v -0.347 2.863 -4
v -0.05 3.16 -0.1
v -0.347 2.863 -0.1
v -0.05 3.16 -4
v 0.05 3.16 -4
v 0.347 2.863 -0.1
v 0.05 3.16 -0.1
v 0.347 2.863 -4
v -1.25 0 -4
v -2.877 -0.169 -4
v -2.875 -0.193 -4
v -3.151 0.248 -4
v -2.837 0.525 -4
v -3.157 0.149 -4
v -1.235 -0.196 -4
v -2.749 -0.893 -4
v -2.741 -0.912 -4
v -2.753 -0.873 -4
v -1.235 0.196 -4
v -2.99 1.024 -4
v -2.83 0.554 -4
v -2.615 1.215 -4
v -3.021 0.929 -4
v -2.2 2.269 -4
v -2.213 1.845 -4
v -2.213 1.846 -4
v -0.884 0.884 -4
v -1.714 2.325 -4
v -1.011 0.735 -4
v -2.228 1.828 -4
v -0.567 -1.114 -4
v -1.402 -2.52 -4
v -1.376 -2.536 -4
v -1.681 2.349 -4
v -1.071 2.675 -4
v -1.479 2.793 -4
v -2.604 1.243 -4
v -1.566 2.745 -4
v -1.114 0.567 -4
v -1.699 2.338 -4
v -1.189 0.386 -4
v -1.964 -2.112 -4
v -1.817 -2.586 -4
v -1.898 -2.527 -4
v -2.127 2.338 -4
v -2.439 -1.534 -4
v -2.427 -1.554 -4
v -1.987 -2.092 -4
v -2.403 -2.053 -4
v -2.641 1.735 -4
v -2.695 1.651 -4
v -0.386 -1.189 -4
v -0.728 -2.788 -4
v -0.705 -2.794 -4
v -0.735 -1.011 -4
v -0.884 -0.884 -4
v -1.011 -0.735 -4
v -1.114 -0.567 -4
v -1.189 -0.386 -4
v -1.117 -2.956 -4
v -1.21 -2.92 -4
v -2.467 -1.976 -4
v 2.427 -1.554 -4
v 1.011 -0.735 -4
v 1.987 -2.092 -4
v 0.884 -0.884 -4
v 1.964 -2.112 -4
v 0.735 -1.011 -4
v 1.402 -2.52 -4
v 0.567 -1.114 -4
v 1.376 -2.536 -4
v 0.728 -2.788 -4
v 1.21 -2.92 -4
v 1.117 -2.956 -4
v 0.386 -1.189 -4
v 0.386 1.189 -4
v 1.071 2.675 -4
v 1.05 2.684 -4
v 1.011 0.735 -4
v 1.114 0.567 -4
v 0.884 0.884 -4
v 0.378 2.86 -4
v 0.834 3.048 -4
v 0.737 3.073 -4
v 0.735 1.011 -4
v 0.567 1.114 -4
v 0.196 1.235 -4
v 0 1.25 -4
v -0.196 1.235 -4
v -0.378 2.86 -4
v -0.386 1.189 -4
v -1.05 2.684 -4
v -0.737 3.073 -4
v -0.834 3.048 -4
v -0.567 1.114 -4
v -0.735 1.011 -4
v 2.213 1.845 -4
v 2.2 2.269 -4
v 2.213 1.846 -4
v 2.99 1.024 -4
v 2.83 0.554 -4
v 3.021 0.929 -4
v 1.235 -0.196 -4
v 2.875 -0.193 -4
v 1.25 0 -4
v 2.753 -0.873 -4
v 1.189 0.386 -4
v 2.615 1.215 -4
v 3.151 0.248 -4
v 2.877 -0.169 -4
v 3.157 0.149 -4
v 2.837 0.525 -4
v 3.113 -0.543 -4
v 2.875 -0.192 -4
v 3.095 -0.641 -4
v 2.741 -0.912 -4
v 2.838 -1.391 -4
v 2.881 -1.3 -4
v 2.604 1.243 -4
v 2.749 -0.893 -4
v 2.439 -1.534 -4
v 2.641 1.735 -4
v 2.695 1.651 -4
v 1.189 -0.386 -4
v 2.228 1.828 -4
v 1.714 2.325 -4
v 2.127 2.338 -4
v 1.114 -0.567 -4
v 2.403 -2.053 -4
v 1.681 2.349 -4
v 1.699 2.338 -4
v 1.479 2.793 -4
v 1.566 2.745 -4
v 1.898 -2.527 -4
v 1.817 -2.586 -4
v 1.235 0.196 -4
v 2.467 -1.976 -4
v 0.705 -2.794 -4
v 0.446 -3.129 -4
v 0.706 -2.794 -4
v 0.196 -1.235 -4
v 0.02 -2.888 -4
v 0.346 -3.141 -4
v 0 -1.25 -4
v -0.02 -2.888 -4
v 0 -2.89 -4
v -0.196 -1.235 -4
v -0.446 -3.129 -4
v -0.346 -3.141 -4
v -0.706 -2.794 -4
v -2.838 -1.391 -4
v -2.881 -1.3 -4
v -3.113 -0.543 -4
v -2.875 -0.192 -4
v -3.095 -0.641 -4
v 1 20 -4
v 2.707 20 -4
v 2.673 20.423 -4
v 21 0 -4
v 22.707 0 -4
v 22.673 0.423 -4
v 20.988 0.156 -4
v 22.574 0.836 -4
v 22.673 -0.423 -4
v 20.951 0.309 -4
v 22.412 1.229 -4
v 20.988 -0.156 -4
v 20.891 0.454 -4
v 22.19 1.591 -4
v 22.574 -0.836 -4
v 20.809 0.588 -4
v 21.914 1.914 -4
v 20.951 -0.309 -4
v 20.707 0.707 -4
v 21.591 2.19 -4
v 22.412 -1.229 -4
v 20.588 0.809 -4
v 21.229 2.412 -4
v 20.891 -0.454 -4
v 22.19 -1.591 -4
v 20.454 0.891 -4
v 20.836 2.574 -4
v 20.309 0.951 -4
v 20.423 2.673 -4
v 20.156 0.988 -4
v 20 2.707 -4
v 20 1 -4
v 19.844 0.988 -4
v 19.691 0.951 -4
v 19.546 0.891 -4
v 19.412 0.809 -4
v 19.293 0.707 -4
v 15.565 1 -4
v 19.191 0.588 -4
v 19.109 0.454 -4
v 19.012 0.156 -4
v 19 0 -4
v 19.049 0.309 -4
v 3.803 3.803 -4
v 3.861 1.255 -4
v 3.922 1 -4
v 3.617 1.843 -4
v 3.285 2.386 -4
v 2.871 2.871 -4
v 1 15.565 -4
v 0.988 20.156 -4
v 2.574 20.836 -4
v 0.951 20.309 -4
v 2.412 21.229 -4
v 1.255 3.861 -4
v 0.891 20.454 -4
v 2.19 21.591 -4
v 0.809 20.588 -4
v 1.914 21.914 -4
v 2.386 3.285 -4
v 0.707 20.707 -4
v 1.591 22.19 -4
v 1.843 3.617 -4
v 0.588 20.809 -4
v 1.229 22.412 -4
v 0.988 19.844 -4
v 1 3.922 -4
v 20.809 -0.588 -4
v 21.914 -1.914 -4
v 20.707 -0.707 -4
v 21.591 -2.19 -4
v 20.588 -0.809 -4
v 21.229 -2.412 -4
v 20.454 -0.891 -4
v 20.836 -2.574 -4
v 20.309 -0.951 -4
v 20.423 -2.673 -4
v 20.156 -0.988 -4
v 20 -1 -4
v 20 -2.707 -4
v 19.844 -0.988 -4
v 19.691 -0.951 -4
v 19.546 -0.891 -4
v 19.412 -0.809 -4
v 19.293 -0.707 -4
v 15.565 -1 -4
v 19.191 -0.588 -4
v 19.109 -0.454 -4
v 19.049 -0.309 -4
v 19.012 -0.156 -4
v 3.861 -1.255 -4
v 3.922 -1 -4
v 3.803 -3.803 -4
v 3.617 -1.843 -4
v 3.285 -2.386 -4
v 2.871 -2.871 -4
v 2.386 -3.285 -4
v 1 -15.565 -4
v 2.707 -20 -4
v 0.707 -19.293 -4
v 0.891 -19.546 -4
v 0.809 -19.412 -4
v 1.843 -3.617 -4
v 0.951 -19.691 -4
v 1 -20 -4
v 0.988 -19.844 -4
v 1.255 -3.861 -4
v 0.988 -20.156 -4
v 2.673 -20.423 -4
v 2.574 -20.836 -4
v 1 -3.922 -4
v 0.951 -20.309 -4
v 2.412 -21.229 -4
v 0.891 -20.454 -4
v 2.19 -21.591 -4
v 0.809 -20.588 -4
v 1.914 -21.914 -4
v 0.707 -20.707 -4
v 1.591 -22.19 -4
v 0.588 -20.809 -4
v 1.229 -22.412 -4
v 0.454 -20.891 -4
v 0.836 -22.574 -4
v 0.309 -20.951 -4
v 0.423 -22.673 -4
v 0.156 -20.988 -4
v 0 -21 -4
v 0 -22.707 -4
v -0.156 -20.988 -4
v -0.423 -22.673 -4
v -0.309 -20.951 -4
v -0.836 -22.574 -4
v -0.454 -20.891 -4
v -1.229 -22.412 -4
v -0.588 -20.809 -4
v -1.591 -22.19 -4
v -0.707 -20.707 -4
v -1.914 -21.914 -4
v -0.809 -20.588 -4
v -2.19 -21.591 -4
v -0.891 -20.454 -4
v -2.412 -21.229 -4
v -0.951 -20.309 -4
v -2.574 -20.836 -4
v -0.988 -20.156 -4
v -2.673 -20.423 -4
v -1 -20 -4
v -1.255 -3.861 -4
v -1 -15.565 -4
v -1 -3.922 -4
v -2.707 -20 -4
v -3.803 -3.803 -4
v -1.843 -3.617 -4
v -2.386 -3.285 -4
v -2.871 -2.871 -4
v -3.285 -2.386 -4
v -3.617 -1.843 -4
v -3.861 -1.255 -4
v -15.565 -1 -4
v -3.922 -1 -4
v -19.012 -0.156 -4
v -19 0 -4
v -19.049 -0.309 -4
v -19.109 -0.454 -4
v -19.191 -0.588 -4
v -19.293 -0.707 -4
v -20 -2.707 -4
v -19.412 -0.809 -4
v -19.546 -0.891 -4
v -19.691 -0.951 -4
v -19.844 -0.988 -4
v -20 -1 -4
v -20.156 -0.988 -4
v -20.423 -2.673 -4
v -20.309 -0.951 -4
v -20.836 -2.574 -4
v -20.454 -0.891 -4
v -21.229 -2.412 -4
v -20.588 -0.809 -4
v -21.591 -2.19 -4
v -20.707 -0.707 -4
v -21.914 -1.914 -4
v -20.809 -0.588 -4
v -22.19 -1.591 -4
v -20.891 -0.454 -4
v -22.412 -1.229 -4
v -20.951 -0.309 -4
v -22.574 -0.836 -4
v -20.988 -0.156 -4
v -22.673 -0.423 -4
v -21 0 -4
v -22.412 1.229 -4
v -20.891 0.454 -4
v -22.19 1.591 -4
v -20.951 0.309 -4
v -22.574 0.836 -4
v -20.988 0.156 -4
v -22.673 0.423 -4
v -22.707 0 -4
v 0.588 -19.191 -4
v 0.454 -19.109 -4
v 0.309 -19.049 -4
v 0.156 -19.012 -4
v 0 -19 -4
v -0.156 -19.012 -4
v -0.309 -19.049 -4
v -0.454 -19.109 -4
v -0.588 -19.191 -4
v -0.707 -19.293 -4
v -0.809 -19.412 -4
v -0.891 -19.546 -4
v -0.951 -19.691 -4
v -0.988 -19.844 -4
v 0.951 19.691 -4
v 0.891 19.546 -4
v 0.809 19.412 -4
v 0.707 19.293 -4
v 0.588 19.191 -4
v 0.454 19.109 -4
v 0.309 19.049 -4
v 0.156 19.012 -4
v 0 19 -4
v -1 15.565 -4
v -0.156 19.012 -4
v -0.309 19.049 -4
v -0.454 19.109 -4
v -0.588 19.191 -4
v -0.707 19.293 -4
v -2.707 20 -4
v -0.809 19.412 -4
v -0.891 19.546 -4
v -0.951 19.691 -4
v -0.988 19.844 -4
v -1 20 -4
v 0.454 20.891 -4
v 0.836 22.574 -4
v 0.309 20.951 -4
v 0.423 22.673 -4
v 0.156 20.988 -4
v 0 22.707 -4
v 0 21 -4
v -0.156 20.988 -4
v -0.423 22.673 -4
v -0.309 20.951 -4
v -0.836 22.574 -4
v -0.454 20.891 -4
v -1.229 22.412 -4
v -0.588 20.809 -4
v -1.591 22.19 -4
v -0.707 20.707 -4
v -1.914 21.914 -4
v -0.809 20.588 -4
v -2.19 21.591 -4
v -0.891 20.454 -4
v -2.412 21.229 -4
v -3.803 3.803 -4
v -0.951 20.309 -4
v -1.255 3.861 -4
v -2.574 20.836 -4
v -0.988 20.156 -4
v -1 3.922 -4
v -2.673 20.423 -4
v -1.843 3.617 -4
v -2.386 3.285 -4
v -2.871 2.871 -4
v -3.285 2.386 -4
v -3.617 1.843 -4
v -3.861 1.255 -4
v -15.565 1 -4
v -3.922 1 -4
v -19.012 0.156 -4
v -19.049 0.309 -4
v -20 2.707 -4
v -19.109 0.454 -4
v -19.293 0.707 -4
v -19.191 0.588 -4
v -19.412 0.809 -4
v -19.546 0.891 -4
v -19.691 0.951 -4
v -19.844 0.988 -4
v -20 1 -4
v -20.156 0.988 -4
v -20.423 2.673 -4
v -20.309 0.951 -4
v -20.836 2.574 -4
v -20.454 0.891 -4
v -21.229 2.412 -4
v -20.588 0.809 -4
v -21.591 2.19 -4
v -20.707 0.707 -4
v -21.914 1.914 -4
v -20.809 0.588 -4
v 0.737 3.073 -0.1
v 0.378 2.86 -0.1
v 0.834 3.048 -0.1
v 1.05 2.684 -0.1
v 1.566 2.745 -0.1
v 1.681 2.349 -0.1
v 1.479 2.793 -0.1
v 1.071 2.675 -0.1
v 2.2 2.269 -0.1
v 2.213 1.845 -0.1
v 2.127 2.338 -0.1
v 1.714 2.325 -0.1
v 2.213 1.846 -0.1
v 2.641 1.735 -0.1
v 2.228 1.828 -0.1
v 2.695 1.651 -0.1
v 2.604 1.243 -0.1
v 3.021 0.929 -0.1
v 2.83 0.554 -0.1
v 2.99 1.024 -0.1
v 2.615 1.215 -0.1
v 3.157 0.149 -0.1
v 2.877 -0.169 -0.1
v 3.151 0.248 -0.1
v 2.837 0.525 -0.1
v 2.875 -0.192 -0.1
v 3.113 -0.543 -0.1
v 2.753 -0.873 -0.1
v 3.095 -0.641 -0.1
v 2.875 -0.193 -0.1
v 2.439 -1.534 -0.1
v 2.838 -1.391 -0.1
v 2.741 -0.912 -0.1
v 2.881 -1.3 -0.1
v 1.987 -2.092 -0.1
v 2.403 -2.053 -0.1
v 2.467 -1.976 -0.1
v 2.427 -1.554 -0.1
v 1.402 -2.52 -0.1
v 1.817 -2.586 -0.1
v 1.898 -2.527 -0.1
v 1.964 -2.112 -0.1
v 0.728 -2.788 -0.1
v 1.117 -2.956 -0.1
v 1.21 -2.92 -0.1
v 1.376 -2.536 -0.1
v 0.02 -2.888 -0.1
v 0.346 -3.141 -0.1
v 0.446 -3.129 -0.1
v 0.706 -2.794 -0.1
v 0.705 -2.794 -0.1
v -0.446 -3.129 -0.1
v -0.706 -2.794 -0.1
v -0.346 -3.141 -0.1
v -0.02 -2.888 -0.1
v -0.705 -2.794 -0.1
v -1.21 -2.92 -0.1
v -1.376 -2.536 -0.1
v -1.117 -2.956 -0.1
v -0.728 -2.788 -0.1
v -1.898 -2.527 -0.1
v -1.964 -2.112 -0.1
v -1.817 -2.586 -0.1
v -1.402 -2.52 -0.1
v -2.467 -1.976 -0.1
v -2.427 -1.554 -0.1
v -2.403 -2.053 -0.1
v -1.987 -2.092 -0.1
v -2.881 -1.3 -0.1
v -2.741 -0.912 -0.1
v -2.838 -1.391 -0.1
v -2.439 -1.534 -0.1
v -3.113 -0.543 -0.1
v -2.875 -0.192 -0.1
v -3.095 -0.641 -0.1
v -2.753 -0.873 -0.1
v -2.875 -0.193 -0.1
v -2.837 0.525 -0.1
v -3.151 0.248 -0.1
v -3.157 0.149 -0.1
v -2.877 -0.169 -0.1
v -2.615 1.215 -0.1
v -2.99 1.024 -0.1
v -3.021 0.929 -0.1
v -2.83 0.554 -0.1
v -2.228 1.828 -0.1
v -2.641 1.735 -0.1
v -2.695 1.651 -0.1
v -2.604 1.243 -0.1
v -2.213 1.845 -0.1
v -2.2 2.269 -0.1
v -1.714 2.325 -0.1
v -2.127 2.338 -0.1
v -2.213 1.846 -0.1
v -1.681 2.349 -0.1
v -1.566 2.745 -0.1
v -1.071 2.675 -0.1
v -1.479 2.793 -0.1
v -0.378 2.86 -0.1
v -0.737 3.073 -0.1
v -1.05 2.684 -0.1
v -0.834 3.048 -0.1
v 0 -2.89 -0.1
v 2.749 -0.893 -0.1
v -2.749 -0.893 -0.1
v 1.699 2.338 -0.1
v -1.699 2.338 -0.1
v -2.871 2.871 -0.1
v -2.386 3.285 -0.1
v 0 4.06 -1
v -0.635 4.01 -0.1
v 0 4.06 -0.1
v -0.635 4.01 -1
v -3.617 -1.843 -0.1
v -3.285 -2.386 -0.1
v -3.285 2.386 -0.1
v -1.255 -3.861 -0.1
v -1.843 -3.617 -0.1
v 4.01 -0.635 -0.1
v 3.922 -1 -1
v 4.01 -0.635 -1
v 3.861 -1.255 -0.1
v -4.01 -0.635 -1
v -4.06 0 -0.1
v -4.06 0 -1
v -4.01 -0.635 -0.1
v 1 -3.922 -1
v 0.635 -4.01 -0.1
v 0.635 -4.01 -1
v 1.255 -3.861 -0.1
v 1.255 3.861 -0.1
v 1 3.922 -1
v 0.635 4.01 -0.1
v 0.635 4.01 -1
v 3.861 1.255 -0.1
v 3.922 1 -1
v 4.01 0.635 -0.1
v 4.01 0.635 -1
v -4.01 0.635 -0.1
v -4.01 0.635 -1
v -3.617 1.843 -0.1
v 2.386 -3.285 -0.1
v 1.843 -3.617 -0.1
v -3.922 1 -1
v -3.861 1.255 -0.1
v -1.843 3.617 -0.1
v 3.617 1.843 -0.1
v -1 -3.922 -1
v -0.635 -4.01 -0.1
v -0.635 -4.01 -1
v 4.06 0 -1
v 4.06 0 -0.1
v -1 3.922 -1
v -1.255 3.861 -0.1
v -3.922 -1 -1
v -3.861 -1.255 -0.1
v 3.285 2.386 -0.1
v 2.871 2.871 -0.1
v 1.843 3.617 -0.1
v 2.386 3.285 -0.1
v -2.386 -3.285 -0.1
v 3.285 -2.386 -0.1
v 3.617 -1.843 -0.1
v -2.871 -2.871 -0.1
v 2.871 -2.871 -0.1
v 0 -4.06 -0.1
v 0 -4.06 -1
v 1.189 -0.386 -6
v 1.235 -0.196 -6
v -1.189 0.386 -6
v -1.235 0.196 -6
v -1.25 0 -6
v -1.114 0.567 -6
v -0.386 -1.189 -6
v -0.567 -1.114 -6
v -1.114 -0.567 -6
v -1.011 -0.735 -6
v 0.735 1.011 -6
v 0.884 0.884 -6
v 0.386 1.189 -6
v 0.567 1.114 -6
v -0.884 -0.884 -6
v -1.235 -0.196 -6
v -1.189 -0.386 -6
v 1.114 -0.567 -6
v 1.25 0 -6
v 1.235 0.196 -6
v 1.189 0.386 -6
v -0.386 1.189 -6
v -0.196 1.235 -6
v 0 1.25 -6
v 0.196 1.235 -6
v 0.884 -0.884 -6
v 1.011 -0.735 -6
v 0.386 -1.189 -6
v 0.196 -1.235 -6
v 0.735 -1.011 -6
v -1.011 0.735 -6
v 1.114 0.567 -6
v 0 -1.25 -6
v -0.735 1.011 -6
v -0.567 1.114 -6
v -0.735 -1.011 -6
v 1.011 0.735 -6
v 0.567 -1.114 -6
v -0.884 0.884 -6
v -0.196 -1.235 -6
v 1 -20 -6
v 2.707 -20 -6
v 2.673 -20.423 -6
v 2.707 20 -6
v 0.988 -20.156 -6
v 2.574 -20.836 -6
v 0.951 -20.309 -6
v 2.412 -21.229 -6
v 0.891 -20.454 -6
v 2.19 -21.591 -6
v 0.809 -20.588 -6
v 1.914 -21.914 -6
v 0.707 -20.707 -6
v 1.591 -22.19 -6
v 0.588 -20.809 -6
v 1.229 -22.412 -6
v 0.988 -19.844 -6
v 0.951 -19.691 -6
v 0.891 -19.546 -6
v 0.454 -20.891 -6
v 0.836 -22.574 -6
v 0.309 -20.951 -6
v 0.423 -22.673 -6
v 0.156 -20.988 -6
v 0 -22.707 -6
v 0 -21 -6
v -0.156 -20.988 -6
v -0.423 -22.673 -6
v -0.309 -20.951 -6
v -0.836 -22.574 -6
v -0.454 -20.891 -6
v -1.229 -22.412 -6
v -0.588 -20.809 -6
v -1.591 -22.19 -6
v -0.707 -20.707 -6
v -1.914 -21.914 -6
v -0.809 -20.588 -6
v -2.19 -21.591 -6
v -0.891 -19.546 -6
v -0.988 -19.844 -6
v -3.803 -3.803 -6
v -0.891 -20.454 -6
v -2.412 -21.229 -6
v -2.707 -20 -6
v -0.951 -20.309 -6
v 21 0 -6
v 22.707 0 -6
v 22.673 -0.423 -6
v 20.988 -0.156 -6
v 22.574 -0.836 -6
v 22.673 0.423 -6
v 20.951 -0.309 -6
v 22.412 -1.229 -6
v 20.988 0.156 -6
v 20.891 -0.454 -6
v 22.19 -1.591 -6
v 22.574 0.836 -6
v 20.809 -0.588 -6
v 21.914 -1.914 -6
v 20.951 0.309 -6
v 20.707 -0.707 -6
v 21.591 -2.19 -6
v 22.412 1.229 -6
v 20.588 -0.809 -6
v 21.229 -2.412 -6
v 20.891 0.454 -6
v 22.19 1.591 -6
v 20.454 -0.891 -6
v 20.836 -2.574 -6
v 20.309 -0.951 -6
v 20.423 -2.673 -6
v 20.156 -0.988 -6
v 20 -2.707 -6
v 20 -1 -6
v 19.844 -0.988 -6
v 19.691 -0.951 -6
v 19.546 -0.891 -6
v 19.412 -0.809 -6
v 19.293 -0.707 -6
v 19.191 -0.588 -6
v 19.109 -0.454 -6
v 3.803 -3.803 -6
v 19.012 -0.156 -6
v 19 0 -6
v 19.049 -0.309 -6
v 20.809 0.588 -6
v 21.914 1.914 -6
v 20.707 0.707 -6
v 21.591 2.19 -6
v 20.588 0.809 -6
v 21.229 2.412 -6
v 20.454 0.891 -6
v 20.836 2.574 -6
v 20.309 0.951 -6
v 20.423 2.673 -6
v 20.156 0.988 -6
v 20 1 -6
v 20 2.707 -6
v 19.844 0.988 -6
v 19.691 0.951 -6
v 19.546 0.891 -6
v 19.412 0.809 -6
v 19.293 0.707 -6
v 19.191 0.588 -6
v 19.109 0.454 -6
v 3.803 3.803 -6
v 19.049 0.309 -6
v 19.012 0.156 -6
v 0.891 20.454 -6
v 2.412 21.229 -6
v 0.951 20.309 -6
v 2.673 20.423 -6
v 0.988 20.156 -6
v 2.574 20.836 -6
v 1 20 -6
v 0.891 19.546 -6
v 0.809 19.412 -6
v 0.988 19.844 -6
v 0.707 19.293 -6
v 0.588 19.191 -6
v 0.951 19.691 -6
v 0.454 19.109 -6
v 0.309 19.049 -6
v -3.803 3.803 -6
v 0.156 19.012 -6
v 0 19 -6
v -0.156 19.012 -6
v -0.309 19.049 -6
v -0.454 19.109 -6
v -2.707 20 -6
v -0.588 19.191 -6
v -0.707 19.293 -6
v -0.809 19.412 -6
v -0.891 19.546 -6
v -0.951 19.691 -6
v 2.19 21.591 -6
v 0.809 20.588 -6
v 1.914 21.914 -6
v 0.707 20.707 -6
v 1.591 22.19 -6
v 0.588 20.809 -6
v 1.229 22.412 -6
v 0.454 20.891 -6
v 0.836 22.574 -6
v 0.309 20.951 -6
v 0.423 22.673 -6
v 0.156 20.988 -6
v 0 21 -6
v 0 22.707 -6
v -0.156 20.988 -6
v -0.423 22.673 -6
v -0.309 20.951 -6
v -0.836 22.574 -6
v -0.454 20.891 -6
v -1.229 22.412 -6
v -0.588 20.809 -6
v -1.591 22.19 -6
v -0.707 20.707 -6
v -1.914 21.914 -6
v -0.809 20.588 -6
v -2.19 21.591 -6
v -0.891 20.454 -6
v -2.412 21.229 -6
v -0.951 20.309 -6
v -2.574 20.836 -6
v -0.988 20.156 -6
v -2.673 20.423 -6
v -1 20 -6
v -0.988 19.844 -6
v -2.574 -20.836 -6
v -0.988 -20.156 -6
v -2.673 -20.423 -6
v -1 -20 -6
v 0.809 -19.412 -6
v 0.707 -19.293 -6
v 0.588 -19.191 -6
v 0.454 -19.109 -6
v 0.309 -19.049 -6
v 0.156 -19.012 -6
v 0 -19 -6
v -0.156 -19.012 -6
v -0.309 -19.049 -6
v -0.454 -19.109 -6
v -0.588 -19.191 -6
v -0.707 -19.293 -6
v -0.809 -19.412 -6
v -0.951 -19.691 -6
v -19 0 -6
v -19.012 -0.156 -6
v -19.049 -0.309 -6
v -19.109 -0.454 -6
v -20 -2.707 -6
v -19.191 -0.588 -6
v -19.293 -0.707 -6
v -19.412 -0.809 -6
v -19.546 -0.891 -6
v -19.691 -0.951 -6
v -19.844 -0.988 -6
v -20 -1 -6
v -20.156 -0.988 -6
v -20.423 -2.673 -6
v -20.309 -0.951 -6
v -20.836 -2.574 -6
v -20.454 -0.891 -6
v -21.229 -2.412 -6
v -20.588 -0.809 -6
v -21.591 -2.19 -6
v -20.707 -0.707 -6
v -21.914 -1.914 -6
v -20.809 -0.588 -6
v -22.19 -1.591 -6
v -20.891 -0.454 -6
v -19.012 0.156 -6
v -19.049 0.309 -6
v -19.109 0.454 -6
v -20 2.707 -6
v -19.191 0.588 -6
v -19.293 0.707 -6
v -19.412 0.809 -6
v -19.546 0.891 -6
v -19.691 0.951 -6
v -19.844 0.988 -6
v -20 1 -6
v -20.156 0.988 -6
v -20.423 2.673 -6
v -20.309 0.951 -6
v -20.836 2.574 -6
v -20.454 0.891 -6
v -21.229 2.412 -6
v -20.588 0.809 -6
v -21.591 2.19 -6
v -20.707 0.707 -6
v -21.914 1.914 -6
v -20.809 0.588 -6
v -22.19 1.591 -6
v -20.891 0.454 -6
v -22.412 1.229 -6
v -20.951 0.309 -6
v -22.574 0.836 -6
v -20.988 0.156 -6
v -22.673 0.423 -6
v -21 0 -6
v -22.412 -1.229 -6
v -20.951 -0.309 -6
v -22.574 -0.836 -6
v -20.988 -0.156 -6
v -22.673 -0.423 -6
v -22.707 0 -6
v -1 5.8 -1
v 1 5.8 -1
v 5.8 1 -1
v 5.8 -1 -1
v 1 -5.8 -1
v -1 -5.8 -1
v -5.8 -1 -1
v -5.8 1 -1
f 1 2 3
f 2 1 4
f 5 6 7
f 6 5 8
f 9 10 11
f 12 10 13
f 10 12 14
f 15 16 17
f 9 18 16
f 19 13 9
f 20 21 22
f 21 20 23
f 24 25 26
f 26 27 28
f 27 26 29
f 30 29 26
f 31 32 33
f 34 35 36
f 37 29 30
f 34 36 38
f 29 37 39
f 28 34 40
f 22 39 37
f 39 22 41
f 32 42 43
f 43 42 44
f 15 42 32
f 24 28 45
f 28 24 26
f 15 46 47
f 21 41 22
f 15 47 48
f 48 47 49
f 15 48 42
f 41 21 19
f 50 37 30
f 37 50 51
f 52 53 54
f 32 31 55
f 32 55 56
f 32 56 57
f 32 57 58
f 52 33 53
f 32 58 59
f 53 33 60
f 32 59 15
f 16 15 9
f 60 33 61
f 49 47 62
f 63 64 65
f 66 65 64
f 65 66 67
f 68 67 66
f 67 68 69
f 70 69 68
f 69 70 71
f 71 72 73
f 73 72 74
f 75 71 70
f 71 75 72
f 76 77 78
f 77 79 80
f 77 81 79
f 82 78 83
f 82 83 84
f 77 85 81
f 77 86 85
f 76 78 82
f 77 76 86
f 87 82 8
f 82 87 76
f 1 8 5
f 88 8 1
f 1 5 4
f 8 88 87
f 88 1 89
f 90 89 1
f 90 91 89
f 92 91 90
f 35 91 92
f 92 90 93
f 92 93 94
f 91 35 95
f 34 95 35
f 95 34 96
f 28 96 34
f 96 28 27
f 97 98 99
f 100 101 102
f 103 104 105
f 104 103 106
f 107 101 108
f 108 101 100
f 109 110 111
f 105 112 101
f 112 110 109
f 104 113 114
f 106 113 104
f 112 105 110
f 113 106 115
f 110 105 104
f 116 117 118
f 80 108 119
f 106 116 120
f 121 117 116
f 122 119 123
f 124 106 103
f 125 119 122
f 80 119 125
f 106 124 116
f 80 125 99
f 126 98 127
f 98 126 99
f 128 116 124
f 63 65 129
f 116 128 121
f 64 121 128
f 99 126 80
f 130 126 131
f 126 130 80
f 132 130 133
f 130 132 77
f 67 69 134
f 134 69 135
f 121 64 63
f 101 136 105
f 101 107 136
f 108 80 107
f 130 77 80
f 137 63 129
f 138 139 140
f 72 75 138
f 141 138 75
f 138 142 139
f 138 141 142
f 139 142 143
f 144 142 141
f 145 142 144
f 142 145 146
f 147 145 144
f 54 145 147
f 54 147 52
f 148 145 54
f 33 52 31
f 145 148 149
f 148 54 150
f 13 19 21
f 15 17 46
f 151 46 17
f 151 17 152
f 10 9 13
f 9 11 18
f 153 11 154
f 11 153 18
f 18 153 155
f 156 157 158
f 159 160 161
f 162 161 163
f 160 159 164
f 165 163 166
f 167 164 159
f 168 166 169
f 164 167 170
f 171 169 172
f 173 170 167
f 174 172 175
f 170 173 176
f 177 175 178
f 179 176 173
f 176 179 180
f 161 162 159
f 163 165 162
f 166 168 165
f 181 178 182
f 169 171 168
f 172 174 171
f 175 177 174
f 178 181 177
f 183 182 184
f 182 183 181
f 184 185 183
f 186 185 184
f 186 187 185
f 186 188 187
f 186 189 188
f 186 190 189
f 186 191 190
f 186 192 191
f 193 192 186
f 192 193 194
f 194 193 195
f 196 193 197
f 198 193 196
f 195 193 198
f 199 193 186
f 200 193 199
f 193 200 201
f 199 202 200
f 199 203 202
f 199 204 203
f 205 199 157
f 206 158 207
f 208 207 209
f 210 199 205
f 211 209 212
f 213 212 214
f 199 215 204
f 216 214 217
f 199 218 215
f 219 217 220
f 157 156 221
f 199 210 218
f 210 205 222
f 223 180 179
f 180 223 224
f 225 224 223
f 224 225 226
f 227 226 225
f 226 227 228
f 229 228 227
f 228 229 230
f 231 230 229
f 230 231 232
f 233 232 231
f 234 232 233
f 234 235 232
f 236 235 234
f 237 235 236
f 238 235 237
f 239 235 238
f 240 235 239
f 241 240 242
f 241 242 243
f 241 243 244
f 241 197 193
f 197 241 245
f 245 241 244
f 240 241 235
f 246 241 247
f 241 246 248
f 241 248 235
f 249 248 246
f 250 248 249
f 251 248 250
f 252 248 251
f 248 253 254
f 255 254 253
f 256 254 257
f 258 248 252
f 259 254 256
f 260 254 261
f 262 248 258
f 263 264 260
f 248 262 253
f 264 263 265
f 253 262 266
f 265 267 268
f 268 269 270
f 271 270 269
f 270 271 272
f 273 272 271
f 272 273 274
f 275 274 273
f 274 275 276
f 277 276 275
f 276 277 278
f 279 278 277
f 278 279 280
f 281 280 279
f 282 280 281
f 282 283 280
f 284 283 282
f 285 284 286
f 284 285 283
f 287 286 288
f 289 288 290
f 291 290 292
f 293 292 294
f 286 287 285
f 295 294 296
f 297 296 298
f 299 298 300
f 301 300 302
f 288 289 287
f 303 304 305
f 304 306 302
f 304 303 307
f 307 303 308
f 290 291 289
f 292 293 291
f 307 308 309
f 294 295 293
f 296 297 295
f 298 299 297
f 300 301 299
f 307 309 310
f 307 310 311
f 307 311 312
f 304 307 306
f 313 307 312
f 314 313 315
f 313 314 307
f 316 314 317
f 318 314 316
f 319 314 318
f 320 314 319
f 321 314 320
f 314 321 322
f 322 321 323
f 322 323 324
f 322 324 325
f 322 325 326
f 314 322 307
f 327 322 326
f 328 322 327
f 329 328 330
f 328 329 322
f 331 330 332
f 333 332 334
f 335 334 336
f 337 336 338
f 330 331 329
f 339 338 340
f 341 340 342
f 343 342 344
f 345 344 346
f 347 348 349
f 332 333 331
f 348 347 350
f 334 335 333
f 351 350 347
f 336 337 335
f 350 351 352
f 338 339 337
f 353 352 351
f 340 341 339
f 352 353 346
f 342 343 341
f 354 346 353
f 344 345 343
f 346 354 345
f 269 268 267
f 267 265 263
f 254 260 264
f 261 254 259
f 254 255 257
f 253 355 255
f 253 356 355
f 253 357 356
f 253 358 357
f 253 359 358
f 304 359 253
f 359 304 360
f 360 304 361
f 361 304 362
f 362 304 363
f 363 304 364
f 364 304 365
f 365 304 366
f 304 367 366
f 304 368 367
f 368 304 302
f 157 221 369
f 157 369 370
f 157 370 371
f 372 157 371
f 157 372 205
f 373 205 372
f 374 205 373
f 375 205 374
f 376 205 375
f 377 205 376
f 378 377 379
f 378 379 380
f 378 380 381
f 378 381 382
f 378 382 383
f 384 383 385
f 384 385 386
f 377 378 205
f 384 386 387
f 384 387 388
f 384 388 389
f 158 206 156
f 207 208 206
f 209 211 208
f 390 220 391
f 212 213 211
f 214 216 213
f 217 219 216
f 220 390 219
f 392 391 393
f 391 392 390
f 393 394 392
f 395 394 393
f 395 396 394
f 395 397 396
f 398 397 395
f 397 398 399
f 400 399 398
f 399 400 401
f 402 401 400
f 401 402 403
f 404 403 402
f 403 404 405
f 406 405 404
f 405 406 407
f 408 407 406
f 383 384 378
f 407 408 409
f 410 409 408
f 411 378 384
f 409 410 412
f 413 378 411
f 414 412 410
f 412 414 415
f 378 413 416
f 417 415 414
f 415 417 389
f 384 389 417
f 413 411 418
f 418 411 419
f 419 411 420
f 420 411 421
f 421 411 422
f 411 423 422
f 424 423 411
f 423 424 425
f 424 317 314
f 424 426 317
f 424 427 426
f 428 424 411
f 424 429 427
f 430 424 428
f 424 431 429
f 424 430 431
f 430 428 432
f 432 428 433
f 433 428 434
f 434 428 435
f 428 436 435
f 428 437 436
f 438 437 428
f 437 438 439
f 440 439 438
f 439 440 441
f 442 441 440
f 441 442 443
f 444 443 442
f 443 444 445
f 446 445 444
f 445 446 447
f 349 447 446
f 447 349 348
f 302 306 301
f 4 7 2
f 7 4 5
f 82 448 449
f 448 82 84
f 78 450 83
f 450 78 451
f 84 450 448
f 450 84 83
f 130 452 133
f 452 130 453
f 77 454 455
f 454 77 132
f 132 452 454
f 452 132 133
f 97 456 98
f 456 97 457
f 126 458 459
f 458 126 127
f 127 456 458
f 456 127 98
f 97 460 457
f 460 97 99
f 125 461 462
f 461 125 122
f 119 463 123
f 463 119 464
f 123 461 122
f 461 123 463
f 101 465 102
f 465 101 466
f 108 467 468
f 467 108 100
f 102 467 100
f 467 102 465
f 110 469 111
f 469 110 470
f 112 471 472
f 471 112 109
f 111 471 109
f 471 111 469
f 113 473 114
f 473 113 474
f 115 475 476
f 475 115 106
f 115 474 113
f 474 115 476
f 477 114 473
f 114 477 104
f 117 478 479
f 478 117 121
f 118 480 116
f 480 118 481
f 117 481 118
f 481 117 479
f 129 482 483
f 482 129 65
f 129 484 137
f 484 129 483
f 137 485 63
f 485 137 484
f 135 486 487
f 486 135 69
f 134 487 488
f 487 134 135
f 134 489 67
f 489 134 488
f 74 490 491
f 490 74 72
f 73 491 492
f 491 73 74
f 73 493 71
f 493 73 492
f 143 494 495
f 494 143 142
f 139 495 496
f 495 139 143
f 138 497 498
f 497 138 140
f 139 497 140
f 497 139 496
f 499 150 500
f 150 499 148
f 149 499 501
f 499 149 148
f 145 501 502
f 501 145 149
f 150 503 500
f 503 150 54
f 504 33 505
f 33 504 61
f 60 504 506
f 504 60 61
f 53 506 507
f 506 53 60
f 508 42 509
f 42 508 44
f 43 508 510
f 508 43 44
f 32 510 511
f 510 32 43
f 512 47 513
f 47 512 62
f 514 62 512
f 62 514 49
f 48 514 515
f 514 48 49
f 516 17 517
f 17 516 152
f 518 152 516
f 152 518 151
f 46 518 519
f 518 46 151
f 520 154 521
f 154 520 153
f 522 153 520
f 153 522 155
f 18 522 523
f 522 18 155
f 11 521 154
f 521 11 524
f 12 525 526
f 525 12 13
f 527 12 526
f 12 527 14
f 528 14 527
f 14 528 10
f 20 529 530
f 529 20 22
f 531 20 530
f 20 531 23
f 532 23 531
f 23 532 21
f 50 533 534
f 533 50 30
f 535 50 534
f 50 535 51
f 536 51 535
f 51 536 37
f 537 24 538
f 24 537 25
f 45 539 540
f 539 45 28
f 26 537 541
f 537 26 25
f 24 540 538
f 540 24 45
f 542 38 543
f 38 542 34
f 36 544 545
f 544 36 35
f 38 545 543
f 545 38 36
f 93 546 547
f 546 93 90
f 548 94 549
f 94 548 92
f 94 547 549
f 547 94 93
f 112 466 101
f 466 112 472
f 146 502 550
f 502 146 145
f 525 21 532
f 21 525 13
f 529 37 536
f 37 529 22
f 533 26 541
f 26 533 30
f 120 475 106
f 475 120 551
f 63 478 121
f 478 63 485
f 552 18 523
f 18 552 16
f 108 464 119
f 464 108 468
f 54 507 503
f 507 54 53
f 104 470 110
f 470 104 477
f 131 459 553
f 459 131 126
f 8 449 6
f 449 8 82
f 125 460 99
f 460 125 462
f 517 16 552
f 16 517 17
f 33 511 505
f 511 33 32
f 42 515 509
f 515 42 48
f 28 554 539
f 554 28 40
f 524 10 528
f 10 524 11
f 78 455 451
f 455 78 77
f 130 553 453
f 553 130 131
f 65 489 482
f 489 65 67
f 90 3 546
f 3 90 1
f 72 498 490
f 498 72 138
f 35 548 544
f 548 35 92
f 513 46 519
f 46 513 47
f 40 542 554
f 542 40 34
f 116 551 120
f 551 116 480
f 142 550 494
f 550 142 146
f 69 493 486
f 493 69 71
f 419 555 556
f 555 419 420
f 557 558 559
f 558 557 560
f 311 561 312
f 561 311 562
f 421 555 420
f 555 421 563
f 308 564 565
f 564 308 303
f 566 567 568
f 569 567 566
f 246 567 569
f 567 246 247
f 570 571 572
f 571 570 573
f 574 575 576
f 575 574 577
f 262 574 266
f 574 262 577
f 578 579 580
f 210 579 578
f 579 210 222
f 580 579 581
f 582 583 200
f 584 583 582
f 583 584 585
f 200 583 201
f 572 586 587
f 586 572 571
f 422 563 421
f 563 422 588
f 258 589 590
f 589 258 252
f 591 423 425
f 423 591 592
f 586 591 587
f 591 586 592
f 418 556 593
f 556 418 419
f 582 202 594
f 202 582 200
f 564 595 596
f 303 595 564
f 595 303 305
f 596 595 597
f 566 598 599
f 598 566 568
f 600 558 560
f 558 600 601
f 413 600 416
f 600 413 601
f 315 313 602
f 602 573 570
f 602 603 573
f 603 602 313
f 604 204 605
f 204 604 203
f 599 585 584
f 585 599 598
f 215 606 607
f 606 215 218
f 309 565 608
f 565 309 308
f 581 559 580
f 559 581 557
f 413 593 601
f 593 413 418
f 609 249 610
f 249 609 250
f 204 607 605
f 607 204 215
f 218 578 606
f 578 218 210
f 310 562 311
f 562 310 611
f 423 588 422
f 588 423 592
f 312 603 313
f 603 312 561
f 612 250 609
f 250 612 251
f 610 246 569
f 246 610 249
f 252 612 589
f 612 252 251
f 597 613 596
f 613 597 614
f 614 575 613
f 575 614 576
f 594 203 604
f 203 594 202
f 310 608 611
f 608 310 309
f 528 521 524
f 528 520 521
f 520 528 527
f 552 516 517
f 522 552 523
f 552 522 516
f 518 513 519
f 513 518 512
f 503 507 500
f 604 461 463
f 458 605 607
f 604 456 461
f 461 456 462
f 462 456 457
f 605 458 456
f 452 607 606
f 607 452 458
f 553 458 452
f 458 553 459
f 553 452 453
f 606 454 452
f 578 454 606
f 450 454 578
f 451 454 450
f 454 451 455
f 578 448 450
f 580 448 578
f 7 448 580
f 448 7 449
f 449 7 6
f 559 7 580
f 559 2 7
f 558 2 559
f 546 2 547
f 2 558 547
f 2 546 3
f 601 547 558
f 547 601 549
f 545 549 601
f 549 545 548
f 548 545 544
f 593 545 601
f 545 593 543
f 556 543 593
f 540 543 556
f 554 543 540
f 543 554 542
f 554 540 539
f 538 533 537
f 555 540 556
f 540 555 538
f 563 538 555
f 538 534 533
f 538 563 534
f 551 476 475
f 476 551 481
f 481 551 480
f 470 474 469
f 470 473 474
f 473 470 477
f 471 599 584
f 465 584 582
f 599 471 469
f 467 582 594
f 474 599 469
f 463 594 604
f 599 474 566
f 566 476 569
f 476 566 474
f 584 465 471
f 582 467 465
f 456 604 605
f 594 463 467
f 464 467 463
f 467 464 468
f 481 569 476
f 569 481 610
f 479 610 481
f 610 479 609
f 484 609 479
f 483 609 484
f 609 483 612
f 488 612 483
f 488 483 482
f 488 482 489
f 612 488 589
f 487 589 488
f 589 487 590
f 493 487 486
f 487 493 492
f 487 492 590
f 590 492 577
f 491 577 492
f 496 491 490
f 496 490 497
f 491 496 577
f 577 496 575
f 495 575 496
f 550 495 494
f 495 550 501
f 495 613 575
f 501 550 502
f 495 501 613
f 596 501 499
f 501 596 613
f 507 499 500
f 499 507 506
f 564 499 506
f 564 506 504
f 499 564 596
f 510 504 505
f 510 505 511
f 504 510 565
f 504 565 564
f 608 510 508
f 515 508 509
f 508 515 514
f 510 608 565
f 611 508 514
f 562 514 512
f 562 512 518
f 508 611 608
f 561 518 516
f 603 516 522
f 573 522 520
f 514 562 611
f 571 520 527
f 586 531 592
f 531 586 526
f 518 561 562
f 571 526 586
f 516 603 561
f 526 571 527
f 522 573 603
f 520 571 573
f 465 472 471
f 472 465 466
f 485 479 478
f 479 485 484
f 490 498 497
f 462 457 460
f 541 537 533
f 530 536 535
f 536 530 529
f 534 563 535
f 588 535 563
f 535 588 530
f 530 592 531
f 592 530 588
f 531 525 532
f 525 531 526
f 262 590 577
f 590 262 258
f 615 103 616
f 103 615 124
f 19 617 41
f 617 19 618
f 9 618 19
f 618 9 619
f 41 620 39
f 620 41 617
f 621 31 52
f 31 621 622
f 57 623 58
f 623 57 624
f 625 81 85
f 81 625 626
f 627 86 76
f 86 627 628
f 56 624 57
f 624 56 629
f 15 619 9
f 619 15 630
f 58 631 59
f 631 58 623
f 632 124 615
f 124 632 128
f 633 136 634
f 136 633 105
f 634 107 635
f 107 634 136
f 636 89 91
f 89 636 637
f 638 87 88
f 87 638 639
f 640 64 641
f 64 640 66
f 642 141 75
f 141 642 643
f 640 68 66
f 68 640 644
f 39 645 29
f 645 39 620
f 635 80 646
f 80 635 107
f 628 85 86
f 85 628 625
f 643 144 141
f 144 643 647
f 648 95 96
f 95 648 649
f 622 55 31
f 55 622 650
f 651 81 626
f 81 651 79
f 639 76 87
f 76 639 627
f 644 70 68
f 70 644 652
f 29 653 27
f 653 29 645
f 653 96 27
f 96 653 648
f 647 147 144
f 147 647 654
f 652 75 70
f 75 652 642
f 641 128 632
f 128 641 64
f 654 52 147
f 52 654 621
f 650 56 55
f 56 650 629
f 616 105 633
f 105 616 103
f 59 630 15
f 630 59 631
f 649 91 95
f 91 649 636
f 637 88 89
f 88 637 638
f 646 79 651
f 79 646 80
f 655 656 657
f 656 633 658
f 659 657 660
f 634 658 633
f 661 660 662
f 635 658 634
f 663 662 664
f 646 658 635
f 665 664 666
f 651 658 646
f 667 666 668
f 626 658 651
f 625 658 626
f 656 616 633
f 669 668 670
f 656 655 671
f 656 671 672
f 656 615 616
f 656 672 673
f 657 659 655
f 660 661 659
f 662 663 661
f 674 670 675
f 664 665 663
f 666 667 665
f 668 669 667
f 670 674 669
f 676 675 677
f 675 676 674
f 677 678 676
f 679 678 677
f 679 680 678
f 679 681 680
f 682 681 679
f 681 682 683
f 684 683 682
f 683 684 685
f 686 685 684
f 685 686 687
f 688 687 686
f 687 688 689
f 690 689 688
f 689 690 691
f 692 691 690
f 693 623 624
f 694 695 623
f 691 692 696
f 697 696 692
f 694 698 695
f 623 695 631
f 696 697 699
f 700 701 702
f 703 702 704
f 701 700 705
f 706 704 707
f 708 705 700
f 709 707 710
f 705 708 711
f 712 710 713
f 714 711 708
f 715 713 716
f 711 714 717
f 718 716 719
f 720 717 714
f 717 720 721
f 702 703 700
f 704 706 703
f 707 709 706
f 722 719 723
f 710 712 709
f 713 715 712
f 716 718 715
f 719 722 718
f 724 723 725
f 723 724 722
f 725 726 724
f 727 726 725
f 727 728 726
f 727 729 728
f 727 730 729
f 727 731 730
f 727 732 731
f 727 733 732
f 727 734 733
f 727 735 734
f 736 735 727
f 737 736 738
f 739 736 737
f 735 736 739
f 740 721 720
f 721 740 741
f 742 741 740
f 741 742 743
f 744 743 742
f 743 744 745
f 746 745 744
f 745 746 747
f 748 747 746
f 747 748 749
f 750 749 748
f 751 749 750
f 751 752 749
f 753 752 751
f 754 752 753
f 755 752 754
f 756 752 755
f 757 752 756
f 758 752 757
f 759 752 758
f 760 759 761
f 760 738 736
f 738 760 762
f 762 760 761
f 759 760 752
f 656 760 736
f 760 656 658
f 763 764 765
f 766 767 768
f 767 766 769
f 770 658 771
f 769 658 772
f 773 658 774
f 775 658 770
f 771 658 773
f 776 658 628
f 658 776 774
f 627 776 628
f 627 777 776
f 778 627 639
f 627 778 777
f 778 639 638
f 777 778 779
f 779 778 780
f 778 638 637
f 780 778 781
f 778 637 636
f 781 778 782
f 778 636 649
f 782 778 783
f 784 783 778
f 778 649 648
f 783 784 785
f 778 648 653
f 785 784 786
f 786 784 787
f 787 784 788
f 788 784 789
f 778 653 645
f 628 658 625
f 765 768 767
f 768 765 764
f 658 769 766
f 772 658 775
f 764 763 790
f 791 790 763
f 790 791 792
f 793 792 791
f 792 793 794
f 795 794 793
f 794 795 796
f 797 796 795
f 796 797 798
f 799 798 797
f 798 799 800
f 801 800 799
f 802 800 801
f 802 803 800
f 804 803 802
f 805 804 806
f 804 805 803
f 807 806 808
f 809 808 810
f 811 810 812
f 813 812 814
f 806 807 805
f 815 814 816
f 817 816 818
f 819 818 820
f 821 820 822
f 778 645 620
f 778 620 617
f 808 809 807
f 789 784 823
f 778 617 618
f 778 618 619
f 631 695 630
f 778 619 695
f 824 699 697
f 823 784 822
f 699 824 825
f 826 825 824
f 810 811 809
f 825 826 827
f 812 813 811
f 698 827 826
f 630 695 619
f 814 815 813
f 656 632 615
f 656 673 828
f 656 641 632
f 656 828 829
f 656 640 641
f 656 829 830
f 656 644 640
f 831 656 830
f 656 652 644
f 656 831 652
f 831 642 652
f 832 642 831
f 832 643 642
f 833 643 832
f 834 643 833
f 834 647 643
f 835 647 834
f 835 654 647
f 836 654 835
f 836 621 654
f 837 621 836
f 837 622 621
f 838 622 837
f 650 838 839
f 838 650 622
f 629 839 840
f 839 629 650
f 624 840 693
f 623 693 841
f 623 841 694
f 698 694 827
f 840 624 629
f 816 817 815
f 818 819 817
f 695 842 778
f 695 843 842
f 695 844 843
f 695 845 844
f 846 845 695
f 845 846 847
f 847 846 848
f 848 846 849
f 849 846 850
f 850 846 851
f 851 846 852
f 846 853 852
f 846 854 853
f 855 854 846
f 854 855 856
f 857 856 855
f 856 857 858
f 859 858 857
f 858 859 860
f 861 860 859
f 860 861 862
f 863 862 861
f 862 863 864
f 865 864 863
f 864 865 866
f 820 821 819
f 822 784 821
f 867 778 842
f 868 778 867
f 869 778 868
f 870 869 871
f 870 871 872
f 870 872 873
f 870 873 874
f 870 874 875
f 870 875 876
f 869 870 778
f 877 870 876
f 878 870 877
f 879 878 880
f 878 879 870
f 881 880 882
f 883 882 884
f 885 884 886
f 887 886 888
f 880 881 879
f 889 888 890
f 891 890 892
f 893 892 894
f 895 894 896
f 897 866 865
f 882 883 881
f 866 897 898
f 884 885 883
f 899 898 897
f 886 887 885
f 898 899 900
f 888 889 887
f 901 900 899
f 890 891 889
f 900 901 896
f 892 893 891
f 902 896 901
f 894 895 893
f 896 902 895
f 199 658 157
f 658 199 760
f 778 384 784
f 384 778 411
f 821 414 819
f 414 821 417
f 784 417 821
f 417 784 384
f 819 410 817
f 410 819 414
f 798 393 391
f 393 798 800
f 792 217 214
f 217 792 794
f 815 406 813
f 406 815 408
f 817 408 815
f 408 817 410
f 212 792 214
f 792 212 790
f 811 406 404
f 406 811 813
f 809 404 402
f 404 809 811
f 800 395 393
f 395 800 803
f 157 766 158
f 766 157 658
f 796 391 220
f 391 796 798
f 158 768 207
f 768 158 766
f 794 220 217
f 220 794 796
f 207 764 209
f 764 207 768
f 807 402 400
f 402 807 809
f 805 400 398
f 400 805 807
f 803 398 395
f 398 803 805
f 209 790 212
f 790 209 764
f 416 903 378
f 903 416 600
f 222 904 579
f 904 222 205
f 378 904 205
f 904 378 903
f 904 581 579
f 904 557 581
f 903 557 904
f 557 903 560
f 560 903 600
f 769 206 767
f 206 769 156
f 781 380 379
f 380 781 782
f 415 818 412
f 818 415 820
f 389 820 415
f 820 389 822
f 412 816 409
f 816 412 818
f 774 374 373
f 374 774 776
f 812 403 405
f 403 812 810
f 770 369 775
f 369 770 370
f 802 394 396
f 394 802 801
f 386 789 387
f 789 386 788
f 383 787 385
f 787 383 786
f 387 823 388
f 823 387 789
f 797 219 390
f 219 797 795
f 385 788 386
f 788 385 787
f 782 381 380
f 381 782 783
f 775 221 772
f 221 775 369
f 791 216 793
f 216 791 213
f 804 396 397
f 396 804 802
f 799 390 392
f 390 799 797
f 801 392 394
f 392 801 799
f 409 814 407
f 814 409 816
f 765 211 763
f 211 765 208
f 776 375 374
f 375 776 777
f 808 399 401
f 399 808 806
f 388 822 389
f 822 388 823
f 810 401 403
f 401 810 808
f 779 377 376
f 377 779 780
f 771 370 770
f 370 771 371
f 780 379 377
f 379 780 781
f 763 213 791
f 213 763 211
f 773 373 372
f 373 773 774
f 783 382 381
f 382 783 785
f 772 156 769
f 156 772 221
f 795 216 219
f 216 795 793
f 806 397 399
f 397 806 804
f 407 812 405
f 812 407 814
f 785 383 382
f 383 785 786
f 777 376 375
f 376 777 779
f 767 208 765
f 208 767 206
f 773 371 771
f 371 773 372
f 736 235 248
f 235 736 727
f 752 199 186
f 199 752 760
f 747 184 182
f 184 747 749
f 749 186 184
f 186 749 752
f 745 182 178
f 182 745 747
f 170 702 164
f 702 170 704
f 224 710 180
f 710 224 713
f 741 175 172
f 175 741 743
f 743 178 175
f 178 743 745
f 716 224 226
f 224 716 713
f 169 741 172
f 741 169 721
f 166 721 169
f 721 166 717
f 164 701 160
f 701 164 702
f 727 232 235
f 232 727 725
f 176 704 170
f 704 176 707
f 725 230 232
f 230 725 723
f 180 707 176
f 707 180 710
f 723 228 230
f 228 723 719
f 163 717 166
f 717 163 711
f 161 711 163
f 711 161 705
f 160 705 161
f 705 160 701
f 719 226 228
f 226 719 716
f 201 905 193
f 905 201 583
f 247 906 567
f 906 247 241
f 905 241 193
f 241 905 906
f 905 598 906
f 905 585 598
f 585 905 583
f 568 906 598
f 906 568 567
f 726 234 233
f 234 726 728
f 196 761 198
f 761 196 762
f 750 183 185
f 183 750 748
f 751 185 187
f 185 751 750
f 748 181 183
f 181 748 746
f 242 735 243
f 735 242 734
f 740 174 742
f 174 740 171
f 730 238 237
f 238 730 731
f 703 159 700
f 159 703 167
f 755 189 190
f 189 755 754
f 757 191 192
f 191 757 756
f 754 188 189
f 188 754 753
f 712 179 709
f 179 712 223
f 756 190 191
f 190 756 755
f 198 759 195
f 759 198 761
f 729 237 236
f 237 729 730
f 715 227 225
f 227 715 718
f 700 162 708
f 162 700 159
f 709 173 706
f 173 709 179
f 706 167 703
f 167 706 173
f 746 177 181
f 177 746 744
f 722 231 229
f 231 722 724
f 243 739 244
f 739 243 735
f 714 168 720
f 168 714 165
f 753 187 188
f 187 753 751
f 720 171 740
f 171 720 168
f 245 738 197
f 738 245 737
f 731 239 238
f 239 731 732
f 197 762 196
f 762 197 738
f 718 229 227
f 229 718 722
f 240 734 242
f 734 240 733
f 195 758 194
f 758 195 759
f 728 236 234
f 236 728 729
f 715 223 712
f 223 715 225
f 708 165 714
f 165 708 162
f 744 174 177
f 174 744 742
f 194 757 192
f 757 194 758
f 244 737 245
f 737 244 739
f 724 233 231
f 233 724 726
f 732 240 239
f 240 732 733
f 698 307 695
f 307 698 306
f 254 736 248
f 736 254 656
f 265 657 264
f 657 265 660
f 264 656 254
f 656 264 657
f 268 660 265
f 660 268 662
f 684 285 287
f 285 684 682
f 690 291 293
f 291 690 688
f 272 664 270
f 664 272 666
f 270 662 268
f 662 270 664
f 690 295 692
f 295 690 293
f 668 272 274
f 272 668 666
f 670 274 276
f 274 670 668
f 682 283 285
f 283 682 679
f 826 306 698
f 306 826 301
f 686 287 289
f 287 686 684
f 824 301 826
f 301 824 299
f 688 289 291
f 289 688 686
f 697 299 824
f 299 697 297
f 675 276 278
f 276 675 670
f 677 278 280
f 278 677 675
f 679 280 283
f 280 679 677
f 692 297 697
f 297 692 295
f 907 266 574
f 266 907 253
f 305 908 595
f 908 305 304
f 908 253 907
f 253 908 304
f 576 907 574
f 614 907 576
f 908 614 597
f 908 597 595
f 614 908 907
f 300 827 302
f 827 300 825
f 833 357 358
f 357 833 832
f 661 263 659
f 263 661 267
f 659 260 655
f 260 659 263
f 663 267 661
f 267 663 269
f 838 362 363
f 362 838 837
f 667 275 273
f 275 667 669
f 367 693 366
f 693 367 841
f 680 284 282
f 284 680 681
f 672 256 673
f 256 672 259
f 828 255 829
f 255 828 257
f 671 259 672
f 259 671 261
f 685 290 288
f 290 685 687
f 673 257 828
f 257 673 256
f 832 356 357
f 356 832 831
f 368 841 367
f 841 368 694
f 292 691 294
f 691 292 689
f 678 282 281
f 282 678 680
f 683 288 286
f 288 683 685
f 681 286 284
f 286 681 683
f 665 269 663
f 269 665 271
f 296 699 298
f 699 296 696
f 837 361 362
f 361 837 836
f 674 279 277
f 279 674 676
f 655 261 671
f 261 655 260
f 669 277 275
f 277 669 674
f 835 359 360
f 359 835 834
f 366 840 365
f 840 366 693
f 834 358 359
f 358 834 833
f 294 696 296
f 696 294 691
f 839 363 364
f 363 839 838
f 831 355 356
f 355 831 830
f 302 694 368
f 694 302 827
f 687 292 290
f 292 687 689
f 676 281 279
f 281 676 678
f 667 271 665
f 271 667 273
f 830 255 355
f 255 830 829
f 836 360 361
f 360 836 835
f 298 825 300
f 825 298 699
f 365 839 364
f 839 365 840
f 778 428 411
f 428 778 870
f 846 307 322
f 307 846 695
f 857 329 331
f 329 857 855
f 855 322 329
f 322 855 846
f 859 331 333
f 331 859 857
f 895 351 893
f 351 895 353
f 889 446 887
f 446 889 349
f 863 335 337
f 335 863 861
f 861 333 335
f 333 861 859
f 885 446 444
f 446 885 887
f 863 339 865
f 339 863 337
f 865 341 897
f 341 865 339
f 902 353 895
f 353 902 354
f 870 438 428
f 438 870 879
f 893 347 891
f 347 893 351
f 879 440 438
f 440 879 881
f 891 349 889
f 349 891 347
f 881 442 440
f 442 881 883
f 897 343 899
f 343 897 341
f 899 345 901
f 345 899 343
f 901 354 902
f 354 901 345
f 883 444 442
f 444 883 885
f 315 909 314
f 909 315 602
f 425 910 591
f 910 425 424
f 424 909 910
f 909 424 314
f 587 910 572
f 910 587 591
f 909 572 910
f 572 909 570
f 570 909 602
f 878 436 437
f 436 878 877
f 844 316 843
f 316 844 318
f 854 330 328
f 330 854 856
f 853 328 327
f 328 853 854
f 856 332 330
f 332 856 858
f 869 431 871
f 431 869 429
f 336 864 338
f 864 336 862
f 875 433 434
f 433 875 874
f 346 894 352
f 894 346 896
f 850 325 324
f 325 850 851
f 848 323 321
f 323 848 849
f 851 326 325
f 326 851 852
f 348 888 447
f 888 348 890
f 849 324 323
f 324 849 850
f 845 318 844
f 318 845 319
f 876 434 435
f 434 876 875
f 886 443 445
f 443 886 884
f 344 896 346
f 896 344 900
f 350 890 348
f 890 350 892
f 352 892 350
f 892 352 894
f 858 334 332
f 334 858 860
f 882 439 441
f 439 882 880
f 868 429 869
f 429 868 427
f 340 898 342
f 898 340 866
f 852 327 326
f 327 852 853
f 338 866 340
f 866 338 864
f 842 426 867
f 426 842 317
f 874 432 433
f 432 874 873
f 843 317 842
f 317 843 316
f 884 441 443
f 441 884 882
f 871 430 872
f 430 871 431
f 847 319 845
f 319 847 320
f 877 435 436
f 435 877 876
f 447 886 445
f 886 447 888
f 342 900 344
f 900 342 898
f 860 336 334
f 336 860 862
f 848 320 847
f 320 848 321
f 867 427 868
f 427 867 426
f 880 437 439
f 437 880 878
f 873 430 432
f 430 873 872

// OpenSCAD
$fn = 40;

HOLDER_THICKNESS = 1.1;
SCREW_DIAMETER = 2.5;

// @Todo: add HOLDER_THICKNESS and SCREW_DIAMETER in Spline definition and eventually clear

/**
 *  Head / Tooth parameters
 *  Futaba 3F Standard Spline
 *  http://www.servocity.com/html/futaba_servo_splines.html
 *  external diameter, tooth count, tooth height, tooth length, tooth width, thickness
 */
FUTABA_3F_SPLINE = [5.92, 25, 0.3, 0.7, 0.1, 4];

module servo_futaba_3f(length, count) {
    servo_arm(FUTABA_3F_SPLINE, [length, count]);
}

module servo_standard(length, count) {
    servo_futaba_3f(length, count);
}

/**
 *  Tooth
 *
 *    |<-w->|
 *    |_____|___
 *    /     \  ^h
 *  _/       \_v
 *   |<--l-->|
 *
 *  - tooth length (l)
 *  - tooth width (w)
 *  - tooth height (h)
 *  - thickness
 *
 */
module servo_head_tooth(length, width, height, thickness) {
    linear_extrude(height = thickness) {
        polygon([[-length / 2, 0], [-width / 2, height], [width / 2, height], [length / 2,0]]);
    }
}

/**
 *  With PLA material, use clear at 0.3
 *  For ABS, use 0.2
 */
module servo_head(params, clear = 0.2) {

    diameter = params[0];
    count = params[1];
    height = params[2];
    length = params[3];
    width = params[4];
    thickness = params[5];

    % cylinder(r = diameter / 2, h = thickness + 1);

    cylinder(r = diameter / 2 - height + 0.03 + clear, h = thickness);

    for (i = [0 : count]) {
        rotate([0, 0, i * (360 / count)]) {
            translate([0, diameter / 2 - height + clear, 0]) {
                servo_head_tooth(length, width, height, thickness);
            }
        }
    }
}

/**
 *  Servo hold
 *  - Head / Tooth parameters
 *  - Arms params (length and count)
 */
module servo_arm(params, arms) {

    diameter = params[0];
    count = params[1];
    height = params[2];
    length = params[3];
    width = params[4];
    thickness = params[5];

    arm_length = arms[0];
    arm_count = arms[1];

    /**
     *  Servo arm
     *  - length is from center to last hole
     */
    module arm(length, width, head_height, thickness, hole_count = 1) {

        screw_diameter = 2;

        difference() {
            union() {
                cylinder(r = width / 2, h = thickness);

                linear_extrude(height = thickness) {
                    polygon([[-width / 2, 0], [-width / 3, length], [width / 3, length],[width / 2, 0]]);
                }

                translate([0, length, 0]) {
                    cylinder(r = width / 3, h = thickness);
                }

                if (length >= 12) {
                    translate([-thickness / 2 + 2, 3.8, -4]) {
                        rotate([90, 0, 0]) {
                            rotate([0, -90, 0]) {
                                linear_extrude(height = thickness) {
                                    polygon([[-length / 1.7, 4], [0, 4], [0, - head_height + 5], [-2, - head_height + 5]]);
                                }
                            }
                        }
                    }
                }
            }

            // Hole
            for (i = [0 : hole_count - 1]) {
                //translate([0, length - (length / hole_count * i), -1]) {
                translate([0, length - (4 * i), -1]) {
                    cylinder(r = screw_diameter / 2, h = 10);
                }
            }

            cylinder(r = SCREW_DIAMETER / 2, h = 10);
        }
    }

    difference() {
        translate([0, 0, 0.1]) {
            cylinder(r = diameter / 2 + HOLDER_THICKNESS, h = thickness + 1);
        }

        cylinder(r = SCREW_DIAMETER / 2, h = 10);

        servo_head(params);
    }

    // Arm
    translate([0, 0, thickness]) {
        for (i = [0 : arm_count - 1]) {
            rotate([0, 0, i * (360 / arm_count)]) {
                arm(arm_length, diameter + HOLDER_THICKNESS * 2, thickness, 2);
            }
        }
    }
}

module demo() {
    rotate([0, 180, 0])
        servo_standard(20, 4);
}

demo();
